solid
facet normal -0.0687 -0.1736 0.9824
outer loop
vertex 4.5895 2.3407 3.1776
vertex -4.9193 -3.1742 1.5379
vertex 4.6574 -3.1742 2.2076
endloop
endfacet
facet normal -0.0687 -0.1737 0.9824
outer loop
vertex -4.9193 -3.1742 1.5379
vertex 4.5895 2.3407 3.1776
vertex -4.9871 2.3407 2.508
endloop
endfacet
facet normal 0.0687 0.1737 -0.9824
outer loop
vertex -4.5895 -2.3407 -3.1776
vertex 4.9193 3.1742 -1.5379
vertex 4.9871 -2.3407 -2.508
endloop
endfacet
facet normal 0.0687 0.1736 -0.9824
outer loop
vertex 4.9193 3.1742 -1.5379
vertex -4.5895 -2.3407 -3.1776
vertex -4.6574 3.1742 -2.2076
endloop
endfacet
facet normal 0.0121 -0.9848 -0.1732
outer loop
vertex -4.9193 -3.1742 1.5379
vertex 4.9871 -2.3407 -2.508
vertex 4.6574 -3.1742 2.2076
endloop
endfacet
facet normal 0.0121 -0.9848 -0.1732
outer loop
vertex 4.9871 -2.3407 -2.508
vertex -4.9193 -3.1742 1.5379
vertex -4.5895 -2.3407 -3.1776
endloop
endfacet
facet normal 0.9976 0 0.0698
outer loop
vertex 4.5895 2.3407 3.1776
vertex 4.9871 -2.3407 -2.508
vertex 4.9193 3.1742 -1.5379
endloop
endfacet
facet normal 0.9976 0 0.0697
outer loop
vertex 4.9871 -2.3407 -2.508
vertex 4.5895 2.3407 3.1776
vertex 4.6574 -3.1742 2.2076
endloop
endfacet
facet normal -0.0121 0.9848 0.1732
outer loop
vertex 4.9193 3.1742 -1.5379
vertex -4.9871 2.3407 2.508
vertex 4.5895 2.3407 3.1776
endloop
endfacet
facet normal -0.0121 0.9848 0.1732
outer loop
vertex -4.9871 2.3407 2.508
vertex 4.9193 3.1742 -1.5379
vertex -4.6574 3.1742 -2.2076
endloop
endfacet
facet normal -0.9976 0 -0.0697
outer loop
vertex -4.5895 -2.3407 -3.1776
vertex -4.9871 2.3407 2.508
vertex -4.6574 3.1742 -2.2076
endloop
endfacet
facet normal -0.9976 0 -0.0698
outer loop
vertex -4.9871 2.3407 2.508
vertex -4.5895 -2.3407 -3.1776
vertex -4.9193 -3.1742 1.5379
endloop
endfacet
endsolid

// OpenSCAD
//andesite alloy for minetest mod fabricate

size=8; //block=32 //item=8


rotate([10,-4,0]){
cube([size*1.2,size*0.7,size*0.6],center=true);

};
